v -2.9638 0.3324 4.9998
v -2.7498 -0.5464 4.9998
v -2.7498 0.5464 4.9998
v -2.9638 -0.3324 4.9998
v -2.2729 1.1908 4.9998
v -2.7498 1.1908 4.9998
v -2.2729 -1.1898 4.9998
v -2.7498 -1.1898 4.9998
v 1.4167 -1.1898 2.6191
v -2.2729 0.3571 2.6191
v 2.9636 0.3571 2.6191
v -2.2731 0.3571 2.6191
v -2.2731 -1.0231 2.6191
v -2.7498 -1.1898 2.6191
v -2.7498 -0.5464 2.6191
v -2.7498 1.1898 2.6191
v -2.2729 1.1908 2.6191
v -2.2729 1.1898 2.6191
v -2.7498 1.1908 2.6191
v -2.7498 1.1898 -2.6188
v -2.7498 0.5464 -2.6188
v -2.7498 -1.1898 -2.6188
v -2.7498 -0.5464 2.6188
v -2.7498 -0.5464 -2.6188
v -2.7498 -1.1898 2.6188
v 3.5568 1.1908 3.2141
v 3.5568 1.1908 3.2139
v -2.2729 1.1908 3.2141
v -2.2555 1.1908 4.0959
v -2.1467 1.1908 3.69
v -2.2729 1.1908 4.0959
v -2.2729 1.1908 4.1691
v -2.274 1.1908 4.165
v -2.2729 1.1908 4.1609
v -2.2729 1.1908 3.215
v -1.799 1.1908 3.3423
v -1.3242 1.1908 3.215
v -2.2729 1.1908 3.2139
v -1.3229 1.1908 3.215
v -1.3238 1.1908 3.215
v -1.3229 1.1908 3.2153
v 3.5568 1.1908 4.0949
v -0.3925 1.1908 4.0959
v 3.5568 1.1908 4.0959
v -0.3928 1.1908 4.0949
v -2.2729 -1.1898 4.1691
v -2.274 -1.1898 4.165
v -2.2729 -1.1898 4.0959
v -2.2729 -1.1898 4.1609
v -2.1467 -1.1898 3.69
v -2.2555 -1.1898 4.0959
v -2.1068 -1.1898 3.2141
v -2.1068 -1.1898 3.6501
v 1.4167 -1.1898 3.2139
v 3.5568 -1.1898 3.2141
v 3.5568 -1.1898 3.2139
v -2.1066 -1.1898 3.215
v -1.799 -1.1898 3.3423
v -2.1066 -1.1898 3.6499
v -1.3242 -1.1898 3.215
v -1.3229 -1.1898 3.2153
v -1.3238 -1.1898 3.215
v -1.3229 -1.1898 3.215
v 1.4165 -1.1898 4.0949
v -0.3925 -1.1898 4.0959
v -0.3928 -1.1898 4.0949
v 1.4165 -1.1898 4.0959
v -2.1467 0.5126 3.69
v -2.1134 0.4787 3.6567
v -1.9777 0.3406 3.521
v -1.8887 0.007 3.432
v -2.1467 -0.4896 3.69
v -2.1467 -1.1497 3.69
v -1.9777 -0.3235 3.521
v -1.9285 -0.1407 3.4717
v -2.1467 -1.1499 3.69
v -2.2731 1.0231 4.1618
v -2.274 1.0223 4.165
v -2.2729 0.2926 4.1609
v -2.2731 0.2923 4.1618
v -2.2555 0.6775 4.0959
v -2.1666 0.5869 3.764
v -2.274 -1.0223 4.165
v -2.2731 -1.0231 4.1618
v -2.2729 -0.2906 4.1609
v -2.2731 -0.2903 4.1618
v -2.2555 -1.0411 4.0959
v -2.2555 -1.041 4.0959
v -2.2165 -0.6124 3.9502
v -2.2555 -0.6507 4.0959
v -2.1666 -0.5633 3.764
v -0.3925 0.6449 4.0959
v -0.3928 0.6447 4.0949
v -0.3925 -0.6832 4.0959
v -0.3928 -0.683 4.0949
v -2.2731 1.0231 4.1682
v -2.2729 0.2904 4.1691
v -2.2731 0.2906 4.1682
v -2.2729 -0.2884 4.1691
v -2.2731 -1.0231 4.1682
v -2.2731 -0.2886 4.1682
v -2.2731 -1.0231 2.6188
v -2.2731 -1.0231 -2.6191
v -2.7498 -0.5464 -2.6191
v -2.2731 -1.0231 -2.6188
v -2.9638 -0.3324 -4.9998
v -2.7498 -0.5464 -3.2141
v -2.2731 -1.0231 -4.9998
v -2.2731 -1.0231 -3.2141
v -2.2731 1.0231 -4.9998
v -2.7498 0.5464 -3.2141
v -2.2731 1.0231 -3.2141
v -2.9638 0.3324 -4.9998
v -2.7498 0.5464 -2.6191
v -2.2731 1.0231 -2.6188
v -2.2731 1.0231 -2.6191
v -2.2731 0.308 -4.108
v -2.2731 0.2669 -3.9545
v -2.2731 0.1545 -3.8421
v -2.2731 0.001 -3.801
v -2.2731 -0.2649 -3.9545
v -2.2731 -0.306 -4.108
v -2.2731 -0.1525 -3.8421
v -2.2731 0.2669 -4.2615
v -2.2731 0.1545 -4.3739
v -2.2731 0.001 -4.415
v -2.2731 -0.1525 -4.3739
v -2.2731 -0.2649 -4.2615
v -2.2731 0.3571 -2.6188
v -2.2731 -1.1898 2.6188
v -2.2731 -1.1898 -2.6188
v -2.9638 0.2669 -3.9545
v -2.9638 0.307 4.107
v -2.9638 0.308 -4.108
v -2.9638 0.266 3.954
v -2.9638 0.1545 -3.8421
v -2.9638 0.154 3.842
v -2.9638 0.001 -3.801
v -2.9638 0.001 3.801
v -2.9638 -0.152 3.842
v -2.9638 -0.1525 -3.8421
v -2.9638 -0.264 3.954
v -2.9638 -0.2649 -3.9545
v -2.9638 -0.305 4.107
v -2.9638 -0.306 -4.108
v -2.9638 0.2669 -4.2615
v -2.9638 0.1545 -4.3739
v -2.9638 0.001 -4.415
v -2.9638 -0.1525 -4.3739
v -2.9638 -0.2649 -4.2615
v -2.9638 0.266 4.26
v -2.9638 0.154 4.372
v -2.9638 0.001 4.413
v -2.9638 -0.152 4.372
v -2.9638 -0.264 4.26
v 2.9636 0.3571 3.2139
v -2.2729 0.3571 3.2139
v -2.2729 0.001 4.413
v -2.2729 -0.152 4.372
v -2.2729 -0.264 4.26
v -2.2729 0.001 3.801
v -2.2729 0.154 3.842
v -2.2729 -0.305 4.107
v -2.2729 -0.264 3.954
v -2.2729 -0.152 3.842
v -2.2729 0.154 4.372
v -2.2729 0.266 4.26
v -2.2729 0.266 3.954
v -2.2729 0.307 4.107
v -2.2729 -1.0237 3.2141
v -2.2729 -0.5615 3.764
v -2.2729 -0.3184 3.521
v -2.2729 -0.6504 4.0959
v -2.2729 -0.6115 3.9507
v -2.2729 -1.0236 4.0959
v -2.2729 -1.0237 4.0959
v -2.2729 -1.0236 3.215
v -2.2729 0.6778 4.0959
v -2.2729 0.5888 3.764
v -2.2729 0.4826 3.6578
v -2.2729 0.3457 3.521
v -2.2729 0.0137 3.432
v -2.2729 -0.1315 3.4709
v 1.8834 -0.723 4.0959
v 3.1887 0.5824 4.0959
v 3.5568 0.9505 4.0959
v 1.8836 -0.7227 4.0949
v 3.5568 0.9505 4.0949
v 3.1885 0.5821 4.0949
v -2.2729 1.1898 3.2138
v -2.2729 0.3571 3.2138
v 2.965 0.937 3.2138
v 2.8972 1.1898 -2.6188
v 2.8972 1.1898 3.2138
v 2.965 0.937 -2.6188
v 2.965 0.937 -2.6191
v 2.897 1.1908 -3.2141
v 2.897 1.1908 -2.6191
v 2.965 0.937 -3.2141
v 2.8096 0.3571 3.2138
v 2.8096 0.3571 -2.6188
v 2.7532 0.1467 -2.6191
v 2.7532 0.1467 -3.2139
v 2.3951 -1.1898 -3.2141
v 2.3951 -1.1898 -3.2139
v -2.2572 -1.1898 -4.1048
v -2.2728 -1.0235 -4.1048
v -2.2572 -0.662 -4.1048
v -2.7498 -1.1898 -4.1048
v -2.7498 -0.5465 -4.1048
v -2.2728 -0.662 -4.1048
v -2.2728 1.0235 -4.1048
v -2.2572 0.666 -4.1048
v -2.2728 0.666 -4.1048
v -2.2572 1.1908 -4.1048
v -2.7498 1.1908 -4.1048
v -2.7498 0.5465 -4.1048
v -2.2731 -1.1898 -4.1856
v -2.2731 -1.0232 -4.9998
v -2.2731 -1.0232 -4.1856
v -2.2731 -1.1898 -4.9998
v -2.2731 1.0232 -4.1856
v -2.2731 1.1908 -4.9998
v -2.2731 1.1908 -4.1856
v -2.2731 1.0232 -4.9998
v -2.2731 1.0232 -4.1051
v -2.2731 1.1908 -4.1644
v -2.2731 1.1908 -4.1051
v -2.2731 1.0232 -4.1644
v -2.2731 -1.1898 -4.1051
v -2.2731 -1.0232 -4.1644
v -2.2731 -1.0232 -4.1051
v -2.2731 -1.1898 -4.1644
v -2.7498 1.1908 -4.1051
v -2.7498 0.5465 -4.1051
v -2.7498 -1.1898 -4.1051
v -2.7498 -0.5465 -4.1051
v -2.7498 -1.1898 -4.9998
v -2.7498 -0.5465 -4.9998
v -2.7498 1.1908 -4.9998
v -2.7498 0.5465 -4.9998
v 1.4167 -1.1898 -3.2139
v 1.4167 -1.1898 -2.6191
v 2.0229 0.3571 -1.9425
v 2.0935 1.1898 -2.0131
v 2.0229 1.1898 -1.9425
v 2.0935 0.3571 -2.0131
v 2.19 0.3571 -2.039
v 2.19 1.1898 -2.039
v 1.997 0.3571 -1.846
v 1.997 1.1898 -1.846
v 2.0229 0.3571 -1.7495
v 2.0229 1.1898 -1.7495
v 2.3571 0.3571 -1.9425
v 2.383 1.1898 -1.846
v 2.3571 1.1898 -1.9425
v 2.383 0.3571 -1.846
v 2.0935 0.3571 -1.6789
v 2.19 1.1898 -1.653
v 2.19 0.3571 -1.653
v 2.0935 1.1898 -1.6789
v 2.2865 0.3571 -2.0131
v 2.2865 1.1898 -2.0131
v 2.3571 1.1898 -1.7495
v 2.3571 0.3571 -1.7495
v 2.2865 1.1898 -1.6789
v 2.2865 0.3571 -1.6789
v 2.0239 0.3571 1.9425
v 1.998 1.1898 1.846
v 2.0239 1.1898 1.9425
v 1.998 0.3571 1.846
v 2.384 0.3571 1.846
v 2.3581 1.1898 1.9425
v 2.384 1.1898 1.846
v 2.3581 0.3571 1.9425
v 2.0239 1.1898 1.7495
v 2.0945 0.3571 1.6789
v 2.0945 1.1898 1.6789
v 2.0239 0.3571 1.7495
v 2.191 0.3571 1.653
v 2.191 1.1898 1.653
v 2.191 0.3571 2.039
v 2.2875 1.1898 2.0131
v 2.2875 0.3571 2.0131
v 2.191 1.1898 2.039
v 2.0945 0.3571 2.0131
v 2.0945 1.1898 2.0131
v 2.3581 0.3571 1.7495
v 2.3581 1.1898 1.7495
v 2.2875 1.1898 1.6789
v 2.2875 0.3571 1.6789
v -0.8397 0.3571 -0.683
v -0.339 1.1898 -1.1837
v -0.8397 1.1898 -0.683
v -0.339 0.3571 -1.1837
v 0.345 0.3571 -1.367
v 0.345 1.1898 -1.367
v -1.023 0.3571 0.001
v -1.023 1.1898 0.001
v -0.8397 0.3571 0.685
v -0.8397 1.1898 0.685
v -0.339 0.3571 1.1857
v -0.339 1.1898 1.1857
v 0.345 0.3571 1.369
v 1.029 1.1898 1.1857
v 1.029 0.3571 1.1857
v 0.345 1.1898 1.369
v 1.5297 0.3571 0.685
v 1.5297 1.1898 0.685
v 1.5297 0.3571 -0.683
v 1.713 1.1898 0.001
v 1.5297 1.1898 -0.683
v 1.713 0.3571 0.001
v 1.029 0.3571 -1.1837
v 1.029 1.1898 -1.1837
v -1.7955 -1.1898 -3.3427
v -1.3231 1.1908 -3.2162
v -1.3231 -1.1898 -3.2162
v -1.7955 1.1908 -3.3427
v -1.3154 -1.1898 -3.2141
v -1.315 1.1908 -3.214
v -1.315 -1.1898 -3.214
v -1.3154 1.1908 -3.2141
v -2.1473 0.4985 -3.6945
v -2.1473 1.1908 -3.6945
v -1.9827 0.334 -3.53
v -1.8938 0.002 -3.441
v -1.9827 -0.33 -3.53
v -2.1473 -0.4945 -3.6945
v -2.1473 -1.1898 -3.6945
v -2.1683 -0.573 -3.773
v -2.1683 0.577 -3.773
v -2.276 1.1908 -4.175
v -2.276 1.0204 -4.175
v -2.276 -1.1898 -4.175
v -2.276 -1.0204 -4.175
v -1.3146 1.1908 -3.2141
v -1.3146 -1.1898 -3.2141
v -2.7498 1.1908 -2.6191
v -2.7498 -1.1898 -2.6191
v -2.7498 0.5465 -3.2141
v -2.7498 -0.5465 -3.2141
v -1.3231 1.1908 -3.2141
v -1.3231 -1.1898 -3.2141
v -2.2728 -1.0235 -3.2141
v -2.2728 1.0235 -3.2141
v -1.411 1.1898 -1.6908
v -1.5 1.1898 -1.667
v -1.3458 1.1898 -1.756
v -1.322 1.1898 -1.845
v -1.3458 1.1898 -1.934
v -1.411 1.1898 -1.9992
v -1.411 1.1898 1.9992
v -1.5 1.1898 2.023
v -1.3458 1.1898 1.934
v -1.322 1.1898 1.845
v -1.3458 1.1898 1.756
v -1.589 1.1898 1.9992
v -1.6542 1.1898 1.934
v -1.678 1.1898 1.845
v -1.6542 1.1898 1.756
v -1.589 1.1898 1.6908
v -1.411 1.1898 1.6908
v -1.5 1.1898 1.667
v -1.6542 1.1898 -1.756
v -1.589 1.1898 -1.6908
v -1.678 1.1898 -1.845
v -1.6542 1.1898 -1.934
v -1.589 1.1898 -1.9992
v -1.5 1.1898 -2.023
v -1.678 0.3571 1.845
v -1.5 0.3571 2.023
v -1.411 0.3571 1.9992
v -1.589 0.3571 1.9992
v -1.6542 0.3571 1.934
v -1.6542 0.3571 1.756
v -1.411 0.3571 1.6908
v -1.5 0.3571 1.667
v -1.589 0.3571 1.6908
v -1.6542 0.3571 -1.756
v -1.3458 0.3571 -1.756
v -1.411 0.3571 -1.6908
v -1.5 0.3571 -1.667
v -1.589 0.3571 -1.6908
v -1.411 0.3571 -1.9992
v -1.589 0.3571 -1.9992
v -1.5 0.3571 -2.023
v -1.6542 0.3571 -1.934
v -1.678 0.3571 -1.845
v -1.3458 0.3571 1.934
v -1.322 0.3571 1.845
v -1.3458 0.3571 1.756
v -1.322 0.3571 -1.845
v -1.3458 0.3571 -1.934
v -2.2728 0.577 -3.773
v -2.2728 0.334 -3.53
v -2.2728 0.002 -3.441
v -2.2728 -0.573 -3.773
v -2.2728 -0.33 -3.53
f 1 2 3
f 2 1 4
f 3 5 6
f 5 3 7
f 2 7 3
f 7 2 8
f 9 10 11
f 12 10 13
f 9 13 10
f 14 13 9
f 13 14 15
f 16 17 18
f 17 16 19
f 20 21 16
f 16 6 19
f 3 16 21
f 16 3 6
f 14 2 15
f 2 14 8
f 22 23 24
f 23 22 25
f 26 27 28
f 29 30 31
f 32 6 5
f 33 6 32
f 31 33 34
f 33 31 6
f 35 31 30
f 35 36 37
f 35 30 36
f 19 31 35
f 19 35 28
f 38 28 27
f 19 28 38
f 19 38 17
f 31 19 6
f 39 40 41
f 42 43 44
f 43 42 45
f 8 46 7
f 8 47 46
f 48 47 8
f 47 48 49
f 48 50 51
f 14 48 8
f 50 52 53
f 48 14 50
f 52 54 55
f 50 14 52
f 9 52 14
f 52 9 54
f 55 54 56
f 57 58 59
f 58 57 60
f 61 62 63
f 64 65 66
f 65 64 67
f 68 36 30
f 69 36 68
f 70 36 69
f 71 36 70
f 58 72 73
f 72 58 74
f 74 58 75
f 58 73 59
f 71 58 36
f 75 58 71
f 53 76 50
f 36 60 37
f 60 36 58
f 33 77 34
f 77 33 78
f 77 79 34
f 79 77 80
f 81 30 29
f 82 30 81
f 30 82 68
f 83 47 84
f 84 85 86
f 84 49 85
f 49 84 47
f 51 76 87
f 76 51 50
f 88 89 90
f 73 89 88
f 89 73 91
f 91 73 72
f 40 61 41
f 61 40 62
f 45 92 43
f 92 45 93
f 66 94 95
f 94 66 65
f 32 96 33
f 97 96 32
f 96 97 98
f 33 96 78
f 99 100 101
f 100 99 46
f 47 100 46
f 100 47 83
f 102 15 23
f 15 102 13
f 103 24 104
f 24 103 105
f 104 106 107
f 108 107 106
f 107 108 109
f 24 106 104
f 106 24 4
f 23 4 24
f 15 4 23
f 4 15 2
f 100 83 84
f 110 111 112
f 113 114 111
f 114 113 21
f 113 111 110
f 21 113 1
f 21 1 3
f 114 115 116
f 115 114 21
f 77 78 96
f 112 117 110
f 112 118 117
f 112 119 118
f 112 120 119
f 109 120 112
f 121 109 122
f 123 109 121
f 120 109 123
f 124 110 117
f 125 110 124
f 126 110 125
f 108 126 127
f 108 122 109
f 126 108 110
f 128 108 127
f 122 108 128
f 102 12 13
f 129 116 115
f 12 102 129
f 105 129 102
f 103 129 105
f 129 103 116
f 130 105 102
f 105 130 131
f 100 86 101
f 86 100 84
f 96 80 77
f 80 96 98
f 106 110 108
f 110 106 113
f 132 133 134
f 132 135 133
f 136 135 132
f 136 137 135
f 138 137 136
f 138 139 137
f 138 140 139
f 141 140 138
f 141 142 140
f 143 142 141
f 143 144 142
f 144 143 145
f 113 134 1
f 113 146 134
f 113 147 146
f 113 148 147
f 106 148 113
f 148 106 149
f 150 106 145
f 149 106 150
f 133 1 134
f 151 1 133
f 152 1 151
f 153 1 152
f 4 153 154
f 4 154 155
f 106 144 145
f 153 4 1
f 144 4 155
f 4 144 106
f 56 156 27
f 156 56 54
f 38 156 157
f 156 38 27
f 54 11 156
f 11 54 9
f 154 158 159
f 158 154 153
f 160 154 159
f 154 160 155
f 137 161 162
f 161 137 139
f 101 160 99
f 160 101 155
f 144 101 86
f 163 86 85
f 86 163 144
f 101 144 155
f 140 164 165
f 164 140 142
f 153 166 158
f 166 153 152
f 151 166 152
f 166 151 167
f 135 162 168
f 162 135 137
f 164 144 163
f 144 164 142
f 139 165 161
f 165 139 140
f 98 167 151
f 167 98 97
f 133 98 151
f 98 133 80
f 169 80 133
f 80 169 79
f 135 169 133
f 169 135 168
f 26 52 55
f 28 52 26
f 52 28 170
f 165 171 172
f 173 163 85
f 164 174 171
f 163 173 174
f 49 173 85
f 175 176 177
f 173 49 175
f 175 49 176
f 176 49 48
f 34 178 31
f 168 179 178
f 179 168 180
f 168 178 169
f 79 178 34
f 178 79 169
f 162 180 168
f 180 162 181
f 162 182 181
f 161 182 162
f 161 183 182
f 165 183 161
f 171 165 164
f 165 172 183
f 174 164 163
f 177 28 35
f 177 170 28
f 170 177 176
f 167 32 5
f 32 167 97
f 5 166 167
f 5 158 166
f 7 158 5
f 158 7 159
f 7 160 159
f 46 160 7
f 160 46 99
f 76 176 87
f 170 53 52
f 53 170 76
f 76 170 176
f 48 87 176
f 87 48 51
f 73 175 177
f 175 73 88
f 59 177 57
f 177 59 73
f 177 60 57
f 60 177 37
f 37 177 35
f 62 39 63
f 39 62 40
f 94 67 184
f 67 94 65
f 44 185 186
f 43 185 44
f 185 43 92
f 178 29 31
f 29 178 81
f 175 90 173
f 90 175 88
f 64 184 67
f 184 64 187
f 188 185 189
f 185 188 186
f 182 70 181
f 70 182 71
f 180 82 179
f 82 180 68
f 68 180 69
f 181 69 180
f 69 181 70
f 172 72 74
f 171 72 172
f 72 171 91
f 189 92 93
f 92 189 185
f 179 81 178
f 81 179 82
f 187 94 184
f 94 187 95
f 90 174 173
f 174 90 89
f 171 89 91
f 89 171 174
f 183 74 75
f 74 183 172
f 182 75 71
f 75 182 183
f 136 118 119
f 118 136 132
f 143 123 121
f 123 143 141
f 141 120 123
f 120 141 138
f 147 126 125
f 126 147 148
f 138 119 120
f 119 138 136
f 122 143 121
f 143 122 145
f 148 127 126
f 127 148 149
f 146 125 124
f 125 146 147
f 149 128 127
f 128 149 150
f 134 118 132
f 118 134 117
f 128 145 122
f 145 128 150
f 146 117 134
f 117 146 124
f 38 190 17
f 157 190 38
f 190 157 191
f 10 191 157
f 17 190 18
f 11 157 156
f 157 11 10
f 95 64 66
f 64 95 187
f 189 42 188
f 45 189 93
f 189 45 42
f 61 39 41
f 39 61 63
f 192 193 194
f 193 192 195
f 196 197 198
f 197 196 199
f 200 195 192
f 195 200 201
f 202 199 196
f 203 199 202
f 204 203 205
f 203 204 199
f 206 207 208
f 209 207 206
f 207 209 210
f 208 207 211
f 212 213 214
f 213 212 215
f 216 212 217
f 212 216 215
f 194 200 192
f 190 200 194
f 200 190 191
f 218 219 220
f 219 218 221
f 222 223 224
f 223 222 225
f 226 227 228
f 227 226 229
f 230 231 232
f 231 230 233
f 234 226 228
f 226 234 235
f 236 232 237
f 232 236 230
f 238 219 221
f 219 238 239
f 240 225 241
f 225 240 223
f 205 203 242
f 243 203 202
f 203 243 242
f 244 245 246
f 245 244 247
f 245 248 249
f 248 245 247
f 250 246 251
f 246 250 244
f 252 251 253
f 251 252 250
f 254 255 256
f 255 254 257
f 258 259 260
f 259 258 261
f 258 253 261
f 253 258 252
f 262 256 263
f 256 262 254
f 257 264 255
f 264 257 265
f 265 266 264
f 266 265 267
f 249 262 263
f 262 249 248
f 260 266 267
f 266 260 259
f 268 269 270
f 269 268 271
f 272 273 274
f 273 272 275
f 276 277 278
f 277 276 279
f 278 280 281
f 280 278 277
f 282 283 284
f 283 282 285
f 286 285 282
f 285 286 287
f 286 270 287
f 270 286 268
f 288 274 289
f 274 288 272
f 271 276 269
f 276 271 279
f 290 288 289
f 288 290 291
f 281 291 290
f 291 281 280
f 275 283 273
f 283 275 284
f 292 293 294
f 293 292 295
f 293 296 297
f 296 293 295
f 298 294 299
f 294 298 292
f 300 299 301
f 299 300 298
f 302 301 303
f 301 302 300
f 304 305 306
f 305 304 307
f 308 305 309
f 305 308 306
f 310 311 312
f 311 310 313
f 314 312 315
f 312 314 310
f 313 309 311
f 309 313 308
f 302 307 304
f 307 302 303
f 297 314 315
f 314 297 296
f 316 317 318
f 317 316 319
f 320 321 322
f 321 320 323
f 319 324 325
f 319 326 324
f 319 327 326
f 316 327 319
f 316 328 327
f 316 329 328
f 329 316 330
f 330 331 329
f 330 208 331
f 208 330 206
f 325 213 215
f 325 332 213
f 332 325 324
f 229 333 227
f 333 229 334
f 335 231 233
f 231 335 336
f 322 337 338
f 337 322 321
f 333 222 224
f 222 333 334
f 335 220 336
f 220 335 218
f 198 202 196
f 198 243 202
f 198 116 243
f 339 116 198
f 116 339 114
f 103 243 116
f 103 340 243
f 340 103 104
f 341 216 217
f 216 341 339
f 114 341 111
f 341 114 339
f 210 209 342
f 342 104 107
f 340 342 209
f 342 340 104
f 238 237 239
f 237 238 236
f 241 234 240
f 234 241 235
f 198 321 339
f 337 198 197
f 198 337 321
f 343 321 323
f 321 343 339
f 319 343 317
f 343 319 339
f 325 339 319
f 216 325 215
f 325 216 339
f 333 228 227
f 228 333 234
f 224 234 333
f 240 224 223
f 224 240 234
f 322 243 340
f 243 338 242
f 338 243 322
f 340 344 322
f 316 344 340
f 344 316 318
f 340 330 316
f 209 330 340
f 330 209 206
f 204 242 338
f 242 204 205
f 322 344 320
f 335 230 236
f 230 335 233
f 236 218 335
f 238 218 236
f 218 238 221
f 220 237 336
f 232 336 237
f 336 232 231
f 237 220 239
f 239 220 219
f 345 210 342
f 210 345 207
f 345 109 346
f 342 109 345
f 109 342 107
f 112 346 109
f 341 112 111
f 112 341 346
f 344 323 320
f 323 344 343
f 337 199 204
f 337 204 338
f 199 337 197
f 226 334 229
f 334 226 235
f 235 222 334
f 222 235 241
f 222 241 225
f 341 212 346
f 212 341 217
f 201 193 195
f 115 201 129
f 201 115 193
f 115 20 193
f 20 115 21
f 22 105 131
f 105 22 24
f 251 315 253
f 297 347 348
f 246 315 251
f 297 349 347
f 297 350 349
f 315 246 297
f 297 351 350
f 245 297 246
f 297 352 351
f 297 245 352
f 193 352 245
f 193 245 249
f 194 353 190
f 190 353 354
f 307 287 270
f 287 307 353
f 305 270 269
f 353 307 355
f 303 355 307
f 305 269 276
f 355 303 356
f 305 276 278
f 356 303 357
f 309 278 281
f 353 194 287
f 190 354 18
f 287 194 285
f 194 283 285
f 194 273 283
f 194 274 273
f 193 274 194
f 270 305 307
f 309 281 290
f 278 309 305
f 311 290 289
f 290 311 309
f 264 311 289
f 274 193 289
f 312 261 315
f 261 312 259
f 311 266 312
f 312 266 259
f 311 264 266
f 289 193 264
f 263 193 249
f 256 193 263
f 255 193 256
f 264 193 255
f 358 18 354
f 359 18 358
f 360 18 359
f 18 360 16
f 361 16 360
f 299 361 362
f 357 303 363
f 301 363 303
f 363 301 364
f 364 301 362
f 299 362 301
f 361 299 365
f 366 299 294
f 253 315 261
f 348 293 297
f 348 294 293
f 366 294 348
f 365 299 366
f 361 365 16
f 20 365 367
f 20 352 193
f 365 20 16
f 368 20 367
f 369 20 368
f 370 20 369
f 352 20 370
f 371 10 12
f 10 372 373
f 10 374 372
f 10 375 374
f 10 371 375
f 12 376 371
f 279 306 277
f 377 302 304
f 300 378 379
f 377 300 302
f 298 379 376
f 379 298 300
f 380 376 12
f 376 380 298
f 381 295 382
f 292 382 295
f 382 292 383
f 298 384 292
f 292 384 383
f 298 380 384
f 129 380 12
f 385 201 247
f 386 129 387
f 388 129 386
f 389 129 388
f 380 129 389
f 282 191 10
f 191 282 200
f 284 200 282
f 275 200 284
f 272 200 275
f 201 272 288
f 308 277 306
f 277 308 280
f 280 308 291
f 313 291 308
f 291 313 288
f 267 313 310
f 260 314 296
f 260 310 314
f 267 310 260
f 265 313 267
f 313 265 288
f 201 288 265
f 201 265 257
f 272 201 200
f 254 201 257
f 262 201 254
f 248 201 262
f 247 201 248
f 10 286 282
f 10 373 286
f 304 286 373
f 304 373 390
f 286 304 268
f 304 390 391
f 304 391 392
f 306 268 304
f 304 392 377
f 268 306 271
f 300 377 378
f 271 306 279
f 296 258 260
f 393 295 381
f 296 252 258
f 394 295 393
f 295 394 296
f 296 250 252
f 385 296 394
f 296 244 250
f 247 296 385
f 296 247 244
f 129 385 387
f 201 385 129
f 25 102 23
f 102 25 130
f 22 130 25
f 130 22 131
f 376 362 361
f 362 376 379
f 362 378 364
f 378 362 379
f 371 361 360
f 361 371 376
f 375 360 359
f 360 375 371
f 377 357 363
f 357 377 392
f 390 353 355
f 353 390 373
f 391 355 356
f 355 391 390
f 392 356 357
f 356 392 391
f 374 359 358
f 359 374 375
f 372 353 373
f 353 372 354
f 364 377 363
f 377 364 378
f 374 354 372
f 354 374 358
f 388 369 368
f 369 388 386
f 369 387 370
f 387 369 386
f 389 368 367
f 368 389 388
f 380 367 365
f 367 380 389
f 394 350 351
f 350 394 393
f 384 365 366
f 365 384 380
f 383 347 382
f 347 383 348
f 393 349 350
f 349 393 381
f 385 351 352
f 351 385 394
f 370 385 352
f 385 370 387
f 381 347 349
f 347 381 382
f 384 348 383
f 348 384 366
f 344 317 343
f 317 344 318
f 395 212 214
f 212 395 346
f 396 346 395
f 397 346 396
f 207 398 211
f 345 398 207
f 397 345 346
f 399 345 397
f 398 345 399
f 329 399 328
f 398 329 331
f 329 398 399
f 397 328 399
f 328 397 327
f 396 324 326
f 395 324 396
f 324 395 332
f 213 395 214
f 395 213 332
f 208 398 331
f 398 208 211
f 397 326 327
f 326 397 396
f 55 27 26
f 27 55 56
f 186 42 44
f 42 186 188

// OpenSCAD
intersection() {
  translate([0, -0.0005, 0])
  cube(size = [7.1137, 2.8567, 11.9997], center = true);

  union() {
    difference() {
      difference() {
        union() {
          difference() {
            translate([7.675, 0.0005, 3.8095])
            cube(size = [20.8497, 2.3807, 2.3807], center = true);
          
            translate([-1.324, -8.4545, 4.165])
            rotate([180, 90, -90])
            cylinder(h = 19.2908, r1 = 0.95, r2 = 0.95, center = true, $fn = 12);
          }
        
          intersection() {
            translate([11.1504, 2.12151e-15, -6.55])
            rotate([-180, 0, 45])
            cube(size = [20.4307, 20.4307, 23.0997], center = true);
          
            translate([-2.6185, -8.4545, 6.55])
            cube(size = [0.6907, 19.2907, 23.0997], center = true);
          }
        }
      
        intersection() {
          translate([7.568, 0, 0.4475])
          cube(size = [21.0638, 36.1998, 9.1048], center = true);
        
          union() {
            translate([7.05092, -7.05092, 0.2975])
            rotate([-180, 0, 45])
            cube(size = [36.1998, 16.2568, 5.8328], center = true);
          
            translate([0, 0.001, 4.107])
            rotate([180, 90, -180])
            cylinder(h = 36.1998, r1 = 0.306, r2 = 0.306, center = true, $fn = 12);
          }
        }
      }
    
      union() {
        translate([7.568, 0.001, -4.108])
        rotate([180, 90, -180])
        cylinder(h = 21.0638, r1 = 0.307, r2 = 0.307, center = true, $fn = 12);
      
        translate([7.9135, 9.2285, 2.9165])
        cube(size = [20.3728, 17.7428, 0.5948], center = true);
      
        difference() {
          difference() {
            translate([7.9135, 0, 10.657])
            cube(size = [20.3728, 36.1998, 14.8858], center = true);
          
            translate([-12.9712, -1.47573, 0.441])
            rotate([-180, 0, 45])
            cube(size = [15.7689, 19.9429, 7.3099], center = true);
          }
        
          difference() {
            translate([-0.172534, 11.3229, 3.6555])
            rotate([-180, 0, 45])
            cube(size = [20.4309, 19.9429, 0.8809], center = true);
          
            translate([-0.000453763, -0.025996, 4.096])
            rotate([-179.224, 90, 179.776])
            cylinder(h = 36.2, r1 = 0.664, r2 = 0.664, center = true, $fn = 12);
          }
        }
      
        translate([8.389, 8.4555, 3.6545])
        cube(size = [19.4238, 19.2908, 0.8808], center = true);
      }
    }
  
    intersection() {
      difference() {
        difference() {
          union() {
            translate([-3.202, 0.937, -0.4455])
            cylinder(h = 7.3187, r1 = 6.167, r2 = 6.167, center = true, $fn = 12);
          
            translate([-2.6185, 0, -4.5525])
            cube(size = [0.6907, 36.1997, 0.8947], center = true);
          }
        
          union() {
            translate([12.6261, -1.47573, -2.9165])
            rotate([-180, 0, 45])
            cube(size = [20.4308, 16.2568, 0.5948], center = true);
          
            translate([2.19, 9.2285, -1.846])
            rotate([180, 90, -90])
            cylinder(h = 17.7428, r1 = 0.193, r2 = 0.193, center = true, $fn = 12);
          }
        }
      
        union() {
          translate([2.191, 0, 1.846])
          rotate([180, 90, -90])
          cylinder(h = 36.1998, r1 = 0.193, r2 = 0.193, center = true, $fn = 12);
        
          translate([0.345, 0, 0.001])
          rotate([180, 90, -90])
          cylinder(h = 36.1998, r1 = 1.368, r2 = 1.368, center = true, $fn = 12);
        
          translate([-1.315, 8.4555, -4.175])
          rotate([180, 90, -90])
          cylinder(h = 19.2908, r1 = 0.961, r2 = 0.961, center = true, $fn = 12);
        }
      }
    
      union() {
        difference() {
          translate([7.675, 0.0005, -3.8095])
          cube(size = [20.8497, 2.3807, 2.3807], center = true);
        
          translate([11.1504, 1.90996e-15, -4.107])
          rotate([-180, 0, 45])
          cube(size = [20.4308, 20.4308, 1.7858], center = true);
        }
      
        difference() {
          union() {
            translate([7.675, 0.7735, 0.7385])
            cube(size = [20.8497, 0.8327, 6.7147], center = true);
          
            translate([-2.5115, -0.416, 0])
            cube(size = [0.4767, 1.5477, 5.2377], center = true);
          }
        
          union() {
            translate([-1.5, 9.2285, 1.845])
            rotate([180, 90, -90])
            cylinder(h = 17.7428, r1 = 0.178, r2 = 0.178, center = true, $fn = 12);
          
            translate([-1.5, -8.4545, -1.845])
            rotate([180, 90, -90])
            cylinder(h = 19.2908, r1 = 0.178, r2 = 0.178, center = true, $fn = 12);
          }
        }
      
        difference() {
          translate([-1.798, 0.0005, -3.362])
          cube(size = [0.9497, 2.3807, 1.4857], center = true);
        
          translate([0, 0.002, -4.105])
          rotate([0, 90, 0])
          cylinder(h = 36.1998, r1 = 0.664, r2 = 0.664, center = true, $fn = 12);
        }
      }
    }
  }
}
